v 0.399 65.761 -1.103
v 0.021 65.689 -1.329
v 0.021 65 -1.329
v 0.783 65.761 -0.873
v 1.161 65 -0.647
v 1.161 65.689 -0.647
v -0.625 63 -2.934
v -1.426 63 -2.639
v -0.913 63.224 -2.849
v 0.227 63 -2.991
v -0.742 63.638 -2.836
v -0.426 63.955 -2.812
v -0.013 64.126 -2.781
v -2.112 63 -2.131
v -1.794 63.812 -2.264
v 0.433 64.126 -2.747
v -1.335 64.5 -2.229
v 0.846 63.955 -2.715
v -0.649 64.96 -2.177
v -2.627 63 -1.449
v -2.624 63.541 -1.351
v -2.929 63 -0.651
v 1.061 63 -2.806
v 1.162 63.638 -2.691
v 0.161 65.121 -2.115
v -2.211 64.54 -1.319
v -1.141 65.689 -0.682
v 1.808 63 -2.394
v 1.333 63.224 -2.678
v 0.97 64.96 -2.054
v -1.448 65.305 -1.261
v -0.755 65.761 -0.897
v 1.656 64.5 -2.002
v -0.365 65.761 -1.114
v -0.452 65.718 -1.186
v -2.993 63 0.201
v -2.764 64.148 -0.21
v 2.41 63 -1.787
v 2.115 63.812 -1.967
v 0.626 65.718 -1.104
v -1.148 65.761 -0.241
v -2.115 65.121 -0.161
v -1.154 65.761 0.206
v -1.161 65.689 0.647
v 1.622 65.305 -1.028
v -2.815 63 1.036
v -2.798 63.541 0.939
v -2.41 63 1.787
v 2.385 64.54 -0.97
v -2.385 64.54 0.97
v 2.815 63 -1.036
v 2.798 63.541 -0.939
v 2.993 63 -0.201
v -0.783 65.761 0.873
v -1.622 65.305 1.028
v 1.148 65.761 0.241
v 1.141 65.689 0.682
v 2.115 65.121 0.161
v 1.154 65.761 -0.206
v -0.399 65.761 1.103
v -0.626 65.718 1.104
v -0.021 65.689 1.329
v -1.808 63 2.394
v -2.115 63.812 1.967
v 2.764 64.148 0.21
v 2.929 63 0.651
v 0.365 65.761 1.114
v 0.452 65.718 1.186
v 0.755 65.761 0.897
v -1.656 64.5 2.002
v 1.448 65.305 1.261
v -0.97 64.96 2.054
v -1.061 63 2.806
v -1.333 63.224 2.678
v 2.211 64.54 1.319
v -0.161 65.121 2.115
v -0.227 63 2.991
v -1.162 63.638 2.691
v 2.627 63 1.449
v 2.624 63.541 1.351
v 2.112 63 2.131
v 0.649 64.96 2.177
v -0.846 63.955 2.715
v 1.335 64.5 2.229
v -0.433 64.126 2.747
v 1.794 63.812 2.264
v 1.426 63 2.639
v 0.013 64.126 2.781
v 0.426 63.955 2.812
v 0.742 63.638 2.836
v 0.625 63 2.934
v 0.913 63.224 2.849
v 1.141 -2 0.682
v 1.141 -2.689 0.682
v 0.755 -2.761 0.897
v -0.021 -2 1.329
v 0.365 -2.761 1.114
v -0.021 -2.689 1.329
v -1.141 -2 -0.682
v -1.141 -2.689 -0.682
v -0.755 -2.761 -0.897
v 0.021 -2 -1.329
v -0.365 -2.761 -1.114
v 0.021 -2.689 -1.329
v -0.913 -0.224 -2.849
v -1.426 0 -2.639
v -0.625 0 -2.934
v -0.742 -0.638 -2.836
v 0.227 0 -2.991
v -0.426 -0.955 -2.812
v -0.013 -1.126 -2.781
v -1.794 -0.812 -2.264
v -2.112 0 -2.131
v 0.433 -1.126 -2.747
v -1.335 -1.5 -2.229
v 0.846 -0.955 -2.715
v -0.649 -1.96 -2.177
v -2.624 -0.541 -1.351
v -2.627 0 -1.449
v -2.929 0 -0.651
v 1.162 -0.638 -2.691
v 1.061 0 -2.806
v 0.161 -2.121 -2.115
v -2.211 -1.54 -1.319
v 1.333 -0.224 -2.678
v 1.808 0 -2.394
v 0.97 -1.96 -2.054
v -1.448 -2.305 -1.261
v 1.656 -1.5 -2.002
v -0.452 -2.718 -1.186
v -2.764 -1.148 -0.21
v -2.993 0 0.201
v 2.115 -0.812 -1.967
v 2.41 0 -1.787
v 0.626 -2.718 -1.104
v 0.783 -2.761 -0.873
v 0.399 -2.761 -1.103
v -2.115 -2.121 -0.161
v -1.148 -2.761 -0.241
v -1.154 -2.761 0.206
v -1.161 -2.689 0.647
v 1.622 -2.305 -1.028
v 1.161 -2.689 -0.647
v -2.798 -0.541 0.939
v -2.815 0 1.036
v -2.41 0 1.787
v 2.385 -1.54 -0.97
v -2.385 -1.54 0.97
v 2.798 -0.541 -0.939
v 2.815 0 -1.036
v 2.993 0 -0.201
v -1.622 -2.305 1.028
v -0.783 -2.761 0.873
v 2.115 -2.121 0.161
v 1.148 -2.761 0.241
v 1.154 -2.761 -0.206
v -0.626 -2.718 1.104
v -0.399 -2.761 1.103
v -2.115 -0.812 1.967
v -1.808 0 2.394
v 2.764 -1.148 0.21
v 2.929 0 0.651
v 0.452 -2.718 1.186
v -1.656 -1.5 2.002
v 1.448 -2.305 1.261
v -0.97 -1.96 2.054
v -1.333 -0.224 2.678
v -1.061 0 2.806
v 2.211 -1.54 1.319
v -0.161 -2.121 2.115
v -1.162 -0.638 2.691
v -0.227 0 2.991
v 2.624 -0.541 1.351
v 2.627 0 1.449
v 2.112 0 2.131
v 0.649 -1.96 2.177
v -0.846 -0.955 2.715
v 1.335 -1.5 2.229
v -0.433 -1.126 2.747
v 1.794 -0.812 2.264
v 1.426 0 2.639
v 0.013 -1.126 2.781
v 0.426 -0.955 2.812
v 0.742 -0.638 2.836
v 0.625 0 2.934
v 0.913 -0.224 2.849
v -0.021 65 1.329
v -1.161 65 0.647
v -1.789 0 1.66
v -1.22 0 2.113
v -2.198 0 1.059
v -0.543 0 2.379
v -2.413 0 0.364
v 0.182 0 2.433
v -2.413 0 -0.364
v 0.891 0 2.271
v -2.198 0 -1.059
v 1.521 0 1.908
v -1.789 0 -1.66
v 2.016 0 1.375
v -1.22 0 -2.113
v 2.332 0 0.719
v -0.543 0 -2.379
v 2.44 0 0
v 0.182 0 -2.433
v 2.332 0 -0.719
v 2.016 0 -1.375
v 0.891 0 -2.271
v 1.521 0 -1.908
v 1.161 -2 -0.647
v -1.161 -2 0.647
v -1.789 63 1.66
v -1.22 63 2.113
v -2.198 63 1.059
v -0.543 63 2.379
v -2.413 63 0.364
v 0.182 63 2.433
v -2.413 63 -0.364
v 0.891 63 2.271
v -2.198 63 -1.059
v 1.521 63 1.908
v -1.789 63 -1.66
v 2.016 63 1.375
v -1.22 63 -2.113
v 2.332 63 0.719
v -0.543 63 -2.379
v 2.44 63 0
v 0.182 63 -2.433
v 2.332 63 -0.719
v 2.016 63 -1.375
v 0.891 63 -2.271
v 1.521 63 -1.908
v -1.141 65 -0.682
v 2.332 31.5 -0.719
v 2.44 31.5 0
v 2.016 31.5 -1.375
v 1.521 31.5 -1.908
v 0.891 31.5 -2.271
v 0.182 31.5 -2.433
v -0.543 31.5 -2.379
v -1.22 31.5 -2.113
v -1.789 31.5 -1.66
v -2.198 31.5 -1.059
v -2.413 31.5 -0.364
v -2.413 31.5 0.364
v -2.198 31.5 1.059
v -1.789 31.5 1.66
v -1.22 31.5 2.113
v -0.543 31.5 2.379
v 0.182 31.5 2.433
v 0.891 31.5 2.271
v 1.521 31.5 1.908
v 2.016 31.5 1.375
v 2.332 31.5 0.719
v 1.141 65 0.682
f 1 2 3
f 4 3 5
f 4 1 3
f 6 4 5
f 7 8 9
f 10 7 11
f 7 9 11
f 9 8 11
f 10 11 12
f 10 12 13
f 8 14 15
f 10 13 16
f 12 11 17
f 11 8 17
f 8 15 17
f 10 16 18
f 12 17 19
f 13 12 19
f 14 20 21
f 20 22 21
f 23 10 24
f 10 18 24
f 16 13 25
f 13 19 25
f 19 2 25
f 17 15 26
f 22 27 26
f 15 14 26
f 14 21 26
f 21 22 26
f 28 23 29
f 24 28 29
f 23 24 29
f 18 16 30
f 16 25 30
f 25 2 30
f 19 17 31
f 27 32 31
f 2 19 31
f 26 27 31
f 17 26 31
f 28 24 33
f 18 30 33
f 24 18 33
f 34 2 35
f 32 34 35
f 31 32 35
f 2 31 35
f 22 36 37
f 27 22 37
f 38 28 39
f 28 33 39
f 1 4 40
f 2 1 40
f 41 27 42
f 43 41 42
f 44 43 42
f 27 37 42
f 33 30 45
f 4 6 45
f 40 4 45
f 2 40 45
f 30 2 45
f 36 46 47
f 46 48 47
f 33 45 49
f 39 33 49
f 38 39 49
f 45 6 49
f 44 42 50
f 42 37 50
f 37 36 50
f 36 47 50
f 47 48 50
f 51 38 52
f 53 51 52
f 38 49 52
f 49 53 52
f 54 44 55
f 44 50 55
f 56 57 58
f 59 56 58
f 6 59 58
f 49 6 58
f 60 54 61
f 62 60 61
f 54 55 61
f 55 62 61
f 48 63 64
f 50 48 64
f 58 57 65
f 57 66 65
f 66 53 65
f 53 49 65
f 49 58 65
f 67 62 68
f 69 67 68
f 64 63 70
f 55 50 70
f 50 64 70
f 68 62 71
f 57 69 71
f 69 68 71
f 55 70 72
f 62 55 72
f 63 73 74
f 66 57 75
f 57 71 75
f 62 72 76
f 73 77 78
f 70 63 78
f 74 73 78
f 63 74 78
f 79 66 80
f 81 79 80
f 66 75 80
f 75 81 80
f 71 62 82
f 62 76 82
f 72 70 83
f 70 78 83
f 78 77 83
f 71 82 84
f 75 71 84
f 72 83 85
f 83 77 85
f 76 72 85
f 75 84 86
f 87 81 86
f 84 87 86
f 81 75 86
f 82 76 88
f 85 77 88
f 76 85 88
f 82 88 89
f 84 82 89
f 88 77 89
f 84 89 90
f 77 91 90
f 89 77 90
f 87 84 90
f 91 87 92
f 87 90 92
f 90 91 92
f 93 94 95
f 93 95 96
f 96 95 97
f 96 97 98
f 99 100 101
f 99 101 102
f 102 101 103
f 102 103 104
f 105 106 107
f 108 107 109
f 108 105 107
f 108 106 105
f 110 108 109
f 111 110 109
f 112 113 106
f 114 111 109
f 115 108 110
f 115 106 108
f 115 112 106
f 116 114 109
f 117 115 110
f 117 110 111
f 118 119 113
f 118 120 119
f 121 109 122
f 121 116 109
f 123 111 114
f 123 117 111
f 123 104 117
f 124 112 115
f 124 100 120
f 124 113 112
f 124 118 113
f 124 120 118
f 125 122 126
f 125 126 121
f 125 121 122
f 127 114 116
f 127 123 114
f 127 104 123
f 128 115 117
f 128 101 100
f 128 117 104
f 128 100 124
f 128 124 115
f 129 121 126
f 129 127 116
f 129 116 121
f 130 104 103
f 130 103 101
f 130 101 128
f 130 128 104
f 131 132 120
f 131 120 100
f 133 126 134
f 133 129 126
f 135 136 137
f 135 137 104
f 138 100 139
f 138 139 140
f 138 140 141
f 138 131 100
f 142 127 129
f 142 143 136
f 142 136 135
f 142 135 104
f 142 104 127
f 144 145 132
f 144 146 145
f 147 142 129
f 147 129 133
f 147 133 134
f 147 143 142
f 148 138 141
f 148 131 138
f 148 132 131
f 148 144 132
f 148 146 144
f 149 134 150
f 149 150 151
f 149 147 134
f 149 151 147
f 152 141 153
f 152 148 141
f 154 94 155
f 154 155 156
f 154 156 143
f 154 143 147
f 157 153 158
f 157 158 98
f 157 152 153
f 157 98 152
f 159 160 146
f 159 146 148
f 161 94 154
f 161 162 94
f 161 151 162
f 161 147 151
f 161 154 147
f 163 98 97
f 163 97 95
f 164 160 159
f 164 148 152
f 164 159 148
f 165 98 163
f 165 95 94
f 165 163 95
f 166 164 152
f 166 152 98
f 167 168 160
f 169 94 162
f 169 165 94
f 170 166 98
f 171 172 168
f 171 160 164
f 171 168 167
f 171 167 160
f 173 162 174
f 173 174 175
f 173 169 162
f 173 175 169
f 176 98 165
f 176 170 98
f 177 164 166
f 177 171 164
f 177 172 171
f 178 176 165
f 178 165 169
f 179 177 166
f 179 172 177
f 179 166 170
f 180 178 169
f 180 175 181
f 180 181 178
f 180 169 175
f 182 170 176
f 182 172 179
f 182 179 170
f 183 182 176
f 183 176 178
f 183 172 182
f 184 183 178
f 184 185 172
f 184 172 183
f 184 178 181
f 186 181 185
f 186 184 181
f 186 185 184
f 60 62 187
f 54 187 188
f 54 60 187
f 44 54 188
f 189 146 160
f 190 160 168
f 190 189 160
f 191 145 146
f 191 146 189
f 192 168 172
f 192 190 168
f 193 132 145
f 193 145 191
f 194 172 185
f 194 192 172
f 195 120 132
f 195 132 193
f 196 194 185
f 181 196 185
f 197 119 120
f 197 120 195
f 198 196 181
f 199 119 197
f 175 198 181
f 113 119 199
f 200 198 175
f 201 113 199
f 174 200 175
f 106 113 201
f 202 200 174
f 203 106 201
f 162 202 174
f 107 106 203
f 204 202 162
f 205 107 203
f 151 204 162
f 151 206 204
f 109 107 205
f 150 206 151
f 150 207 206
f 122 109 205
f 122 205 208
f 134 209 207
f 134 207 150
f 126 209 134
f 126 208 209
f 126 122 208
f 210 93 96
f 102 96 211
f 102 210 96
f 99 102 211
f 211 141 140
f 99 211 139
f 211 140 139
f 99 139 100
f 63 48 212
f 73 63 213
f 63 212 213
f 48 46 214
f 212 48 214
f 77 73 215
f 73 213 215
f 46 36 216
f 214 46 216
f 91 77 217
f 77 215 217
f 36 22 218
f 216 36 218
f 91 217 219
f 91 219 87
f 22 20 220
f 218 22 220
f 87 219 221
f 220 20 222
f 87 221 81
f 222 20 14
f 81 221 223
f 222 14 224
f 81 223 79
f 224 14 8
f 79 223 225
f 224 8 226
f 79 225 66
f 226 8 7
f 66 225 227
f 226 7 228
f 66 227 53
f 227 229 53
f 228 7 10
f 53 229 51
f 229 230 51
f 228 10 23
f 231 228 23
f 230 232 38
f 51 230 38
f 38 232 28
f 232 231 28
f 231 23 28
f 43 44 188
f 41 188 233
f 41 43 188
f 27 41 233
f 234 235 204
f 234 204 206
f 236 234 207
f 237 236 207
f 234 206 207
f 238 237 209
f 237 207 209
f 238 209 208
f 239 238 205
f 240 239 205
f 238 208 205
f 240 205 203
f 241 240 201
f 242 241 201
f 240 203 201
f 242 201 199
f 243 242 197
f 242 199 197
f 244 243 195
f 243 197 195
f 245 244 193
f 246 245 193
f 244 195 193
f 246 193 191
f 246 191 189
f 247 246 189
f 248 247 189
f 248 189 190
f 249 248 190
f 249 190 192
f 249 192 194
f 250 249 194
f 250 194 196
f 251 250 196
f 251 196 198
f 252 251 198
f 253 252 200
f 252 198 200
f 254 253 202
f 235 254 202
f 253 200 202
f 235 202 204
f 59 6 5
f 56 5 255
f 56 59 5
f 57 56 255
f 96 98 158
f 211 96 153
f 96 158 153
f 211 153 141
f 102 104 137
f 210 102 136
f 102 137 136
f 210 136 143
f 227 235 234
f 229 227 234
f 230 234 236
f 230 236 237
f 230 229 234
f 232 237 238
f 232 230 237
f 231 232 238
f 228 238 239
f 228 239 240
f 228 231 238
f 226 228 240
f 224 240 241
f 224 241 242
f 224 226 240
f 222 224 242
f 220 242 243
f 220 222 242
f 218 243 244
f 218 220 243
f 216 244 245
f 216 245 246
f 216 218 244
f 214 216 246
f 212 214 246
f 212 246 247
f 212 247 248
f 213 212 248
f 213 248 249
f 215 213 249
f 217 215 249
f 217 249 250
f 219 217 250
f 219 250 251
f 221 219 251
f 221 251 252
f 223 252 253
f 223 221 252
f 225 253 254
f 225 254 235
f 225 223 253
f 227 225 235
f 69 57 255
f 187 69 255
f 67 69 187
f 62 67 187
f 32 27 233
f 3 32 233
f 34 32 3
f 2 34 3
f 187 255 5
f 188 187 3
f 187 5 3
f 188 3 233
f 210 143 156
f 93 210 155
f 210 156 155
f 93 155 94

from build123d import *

# Parameters (mm, degrees)
REVOLVE_1_ANGLE     = 180
CUT_EXTRUDE_1_DEPTH = 1
SKETCH_3_R          = 2.44
EXTRUDE_1_DEPTH     = 31.5


with BuildPart() as part:
    # 草图1 → 旋转1 (revolve)
    with BuildSketch(Plane(origin=(0, 0, 0), x_dir=(1, 0, 0), z_dir=(0, 1, 0))):
        with BuildLine():
            Line((-0.227216636, -2.991383058), (0.227216636, 2.991383058))
            ThreePointArc((0.227216636, 2.991383058), (-2.991383058, 0.227216636), (-0.227216636, -2.991383058))
        make_face()
    revolve(axis=Axis((0.227216636, 0, -2.991383058), (-0.07573887865673318, 0, 0.9971276860361569)), revolution_arc=REVOLVE_1_ANGLE)

    # 草图2 → 切除-拉伸1 (cut)
    with BuildSketch(Plane(origin=(0, -3, 0), x_dir=(-1, 0, 0), z_dir=(0, -1, 0))):
        Polygon((1.161360834, -0.646595492), (1.140648539, 0.68247024), (-0.020712296, 1.329065731), (-1.161360834, 0.646595492), (-1.140648539, -0.68247024), (0.020712296, -1.329065731), align=None)
    extrude(amount=-CUT_EXTRUDE_1_DEPTH, mode=Mode.SUBTRACT)

    # 草图3 → 凸台-拉伸1 (add)
    with BuildSketch(Plane(origin=(0, 0, 0), x_dir=(1, 0, 0), z_dir=(0, 1, 0))):
        Circle(SKETCH_3_R)
    extrude(amount=EXTRUDE_1_DEPTH)

    # 镜向1: part across plane


with BuildPart() as part_1:
    add(part.part)
    add(part.part.mirror(Plane.ZX.offset(31.5)))


solid = part_1.part
